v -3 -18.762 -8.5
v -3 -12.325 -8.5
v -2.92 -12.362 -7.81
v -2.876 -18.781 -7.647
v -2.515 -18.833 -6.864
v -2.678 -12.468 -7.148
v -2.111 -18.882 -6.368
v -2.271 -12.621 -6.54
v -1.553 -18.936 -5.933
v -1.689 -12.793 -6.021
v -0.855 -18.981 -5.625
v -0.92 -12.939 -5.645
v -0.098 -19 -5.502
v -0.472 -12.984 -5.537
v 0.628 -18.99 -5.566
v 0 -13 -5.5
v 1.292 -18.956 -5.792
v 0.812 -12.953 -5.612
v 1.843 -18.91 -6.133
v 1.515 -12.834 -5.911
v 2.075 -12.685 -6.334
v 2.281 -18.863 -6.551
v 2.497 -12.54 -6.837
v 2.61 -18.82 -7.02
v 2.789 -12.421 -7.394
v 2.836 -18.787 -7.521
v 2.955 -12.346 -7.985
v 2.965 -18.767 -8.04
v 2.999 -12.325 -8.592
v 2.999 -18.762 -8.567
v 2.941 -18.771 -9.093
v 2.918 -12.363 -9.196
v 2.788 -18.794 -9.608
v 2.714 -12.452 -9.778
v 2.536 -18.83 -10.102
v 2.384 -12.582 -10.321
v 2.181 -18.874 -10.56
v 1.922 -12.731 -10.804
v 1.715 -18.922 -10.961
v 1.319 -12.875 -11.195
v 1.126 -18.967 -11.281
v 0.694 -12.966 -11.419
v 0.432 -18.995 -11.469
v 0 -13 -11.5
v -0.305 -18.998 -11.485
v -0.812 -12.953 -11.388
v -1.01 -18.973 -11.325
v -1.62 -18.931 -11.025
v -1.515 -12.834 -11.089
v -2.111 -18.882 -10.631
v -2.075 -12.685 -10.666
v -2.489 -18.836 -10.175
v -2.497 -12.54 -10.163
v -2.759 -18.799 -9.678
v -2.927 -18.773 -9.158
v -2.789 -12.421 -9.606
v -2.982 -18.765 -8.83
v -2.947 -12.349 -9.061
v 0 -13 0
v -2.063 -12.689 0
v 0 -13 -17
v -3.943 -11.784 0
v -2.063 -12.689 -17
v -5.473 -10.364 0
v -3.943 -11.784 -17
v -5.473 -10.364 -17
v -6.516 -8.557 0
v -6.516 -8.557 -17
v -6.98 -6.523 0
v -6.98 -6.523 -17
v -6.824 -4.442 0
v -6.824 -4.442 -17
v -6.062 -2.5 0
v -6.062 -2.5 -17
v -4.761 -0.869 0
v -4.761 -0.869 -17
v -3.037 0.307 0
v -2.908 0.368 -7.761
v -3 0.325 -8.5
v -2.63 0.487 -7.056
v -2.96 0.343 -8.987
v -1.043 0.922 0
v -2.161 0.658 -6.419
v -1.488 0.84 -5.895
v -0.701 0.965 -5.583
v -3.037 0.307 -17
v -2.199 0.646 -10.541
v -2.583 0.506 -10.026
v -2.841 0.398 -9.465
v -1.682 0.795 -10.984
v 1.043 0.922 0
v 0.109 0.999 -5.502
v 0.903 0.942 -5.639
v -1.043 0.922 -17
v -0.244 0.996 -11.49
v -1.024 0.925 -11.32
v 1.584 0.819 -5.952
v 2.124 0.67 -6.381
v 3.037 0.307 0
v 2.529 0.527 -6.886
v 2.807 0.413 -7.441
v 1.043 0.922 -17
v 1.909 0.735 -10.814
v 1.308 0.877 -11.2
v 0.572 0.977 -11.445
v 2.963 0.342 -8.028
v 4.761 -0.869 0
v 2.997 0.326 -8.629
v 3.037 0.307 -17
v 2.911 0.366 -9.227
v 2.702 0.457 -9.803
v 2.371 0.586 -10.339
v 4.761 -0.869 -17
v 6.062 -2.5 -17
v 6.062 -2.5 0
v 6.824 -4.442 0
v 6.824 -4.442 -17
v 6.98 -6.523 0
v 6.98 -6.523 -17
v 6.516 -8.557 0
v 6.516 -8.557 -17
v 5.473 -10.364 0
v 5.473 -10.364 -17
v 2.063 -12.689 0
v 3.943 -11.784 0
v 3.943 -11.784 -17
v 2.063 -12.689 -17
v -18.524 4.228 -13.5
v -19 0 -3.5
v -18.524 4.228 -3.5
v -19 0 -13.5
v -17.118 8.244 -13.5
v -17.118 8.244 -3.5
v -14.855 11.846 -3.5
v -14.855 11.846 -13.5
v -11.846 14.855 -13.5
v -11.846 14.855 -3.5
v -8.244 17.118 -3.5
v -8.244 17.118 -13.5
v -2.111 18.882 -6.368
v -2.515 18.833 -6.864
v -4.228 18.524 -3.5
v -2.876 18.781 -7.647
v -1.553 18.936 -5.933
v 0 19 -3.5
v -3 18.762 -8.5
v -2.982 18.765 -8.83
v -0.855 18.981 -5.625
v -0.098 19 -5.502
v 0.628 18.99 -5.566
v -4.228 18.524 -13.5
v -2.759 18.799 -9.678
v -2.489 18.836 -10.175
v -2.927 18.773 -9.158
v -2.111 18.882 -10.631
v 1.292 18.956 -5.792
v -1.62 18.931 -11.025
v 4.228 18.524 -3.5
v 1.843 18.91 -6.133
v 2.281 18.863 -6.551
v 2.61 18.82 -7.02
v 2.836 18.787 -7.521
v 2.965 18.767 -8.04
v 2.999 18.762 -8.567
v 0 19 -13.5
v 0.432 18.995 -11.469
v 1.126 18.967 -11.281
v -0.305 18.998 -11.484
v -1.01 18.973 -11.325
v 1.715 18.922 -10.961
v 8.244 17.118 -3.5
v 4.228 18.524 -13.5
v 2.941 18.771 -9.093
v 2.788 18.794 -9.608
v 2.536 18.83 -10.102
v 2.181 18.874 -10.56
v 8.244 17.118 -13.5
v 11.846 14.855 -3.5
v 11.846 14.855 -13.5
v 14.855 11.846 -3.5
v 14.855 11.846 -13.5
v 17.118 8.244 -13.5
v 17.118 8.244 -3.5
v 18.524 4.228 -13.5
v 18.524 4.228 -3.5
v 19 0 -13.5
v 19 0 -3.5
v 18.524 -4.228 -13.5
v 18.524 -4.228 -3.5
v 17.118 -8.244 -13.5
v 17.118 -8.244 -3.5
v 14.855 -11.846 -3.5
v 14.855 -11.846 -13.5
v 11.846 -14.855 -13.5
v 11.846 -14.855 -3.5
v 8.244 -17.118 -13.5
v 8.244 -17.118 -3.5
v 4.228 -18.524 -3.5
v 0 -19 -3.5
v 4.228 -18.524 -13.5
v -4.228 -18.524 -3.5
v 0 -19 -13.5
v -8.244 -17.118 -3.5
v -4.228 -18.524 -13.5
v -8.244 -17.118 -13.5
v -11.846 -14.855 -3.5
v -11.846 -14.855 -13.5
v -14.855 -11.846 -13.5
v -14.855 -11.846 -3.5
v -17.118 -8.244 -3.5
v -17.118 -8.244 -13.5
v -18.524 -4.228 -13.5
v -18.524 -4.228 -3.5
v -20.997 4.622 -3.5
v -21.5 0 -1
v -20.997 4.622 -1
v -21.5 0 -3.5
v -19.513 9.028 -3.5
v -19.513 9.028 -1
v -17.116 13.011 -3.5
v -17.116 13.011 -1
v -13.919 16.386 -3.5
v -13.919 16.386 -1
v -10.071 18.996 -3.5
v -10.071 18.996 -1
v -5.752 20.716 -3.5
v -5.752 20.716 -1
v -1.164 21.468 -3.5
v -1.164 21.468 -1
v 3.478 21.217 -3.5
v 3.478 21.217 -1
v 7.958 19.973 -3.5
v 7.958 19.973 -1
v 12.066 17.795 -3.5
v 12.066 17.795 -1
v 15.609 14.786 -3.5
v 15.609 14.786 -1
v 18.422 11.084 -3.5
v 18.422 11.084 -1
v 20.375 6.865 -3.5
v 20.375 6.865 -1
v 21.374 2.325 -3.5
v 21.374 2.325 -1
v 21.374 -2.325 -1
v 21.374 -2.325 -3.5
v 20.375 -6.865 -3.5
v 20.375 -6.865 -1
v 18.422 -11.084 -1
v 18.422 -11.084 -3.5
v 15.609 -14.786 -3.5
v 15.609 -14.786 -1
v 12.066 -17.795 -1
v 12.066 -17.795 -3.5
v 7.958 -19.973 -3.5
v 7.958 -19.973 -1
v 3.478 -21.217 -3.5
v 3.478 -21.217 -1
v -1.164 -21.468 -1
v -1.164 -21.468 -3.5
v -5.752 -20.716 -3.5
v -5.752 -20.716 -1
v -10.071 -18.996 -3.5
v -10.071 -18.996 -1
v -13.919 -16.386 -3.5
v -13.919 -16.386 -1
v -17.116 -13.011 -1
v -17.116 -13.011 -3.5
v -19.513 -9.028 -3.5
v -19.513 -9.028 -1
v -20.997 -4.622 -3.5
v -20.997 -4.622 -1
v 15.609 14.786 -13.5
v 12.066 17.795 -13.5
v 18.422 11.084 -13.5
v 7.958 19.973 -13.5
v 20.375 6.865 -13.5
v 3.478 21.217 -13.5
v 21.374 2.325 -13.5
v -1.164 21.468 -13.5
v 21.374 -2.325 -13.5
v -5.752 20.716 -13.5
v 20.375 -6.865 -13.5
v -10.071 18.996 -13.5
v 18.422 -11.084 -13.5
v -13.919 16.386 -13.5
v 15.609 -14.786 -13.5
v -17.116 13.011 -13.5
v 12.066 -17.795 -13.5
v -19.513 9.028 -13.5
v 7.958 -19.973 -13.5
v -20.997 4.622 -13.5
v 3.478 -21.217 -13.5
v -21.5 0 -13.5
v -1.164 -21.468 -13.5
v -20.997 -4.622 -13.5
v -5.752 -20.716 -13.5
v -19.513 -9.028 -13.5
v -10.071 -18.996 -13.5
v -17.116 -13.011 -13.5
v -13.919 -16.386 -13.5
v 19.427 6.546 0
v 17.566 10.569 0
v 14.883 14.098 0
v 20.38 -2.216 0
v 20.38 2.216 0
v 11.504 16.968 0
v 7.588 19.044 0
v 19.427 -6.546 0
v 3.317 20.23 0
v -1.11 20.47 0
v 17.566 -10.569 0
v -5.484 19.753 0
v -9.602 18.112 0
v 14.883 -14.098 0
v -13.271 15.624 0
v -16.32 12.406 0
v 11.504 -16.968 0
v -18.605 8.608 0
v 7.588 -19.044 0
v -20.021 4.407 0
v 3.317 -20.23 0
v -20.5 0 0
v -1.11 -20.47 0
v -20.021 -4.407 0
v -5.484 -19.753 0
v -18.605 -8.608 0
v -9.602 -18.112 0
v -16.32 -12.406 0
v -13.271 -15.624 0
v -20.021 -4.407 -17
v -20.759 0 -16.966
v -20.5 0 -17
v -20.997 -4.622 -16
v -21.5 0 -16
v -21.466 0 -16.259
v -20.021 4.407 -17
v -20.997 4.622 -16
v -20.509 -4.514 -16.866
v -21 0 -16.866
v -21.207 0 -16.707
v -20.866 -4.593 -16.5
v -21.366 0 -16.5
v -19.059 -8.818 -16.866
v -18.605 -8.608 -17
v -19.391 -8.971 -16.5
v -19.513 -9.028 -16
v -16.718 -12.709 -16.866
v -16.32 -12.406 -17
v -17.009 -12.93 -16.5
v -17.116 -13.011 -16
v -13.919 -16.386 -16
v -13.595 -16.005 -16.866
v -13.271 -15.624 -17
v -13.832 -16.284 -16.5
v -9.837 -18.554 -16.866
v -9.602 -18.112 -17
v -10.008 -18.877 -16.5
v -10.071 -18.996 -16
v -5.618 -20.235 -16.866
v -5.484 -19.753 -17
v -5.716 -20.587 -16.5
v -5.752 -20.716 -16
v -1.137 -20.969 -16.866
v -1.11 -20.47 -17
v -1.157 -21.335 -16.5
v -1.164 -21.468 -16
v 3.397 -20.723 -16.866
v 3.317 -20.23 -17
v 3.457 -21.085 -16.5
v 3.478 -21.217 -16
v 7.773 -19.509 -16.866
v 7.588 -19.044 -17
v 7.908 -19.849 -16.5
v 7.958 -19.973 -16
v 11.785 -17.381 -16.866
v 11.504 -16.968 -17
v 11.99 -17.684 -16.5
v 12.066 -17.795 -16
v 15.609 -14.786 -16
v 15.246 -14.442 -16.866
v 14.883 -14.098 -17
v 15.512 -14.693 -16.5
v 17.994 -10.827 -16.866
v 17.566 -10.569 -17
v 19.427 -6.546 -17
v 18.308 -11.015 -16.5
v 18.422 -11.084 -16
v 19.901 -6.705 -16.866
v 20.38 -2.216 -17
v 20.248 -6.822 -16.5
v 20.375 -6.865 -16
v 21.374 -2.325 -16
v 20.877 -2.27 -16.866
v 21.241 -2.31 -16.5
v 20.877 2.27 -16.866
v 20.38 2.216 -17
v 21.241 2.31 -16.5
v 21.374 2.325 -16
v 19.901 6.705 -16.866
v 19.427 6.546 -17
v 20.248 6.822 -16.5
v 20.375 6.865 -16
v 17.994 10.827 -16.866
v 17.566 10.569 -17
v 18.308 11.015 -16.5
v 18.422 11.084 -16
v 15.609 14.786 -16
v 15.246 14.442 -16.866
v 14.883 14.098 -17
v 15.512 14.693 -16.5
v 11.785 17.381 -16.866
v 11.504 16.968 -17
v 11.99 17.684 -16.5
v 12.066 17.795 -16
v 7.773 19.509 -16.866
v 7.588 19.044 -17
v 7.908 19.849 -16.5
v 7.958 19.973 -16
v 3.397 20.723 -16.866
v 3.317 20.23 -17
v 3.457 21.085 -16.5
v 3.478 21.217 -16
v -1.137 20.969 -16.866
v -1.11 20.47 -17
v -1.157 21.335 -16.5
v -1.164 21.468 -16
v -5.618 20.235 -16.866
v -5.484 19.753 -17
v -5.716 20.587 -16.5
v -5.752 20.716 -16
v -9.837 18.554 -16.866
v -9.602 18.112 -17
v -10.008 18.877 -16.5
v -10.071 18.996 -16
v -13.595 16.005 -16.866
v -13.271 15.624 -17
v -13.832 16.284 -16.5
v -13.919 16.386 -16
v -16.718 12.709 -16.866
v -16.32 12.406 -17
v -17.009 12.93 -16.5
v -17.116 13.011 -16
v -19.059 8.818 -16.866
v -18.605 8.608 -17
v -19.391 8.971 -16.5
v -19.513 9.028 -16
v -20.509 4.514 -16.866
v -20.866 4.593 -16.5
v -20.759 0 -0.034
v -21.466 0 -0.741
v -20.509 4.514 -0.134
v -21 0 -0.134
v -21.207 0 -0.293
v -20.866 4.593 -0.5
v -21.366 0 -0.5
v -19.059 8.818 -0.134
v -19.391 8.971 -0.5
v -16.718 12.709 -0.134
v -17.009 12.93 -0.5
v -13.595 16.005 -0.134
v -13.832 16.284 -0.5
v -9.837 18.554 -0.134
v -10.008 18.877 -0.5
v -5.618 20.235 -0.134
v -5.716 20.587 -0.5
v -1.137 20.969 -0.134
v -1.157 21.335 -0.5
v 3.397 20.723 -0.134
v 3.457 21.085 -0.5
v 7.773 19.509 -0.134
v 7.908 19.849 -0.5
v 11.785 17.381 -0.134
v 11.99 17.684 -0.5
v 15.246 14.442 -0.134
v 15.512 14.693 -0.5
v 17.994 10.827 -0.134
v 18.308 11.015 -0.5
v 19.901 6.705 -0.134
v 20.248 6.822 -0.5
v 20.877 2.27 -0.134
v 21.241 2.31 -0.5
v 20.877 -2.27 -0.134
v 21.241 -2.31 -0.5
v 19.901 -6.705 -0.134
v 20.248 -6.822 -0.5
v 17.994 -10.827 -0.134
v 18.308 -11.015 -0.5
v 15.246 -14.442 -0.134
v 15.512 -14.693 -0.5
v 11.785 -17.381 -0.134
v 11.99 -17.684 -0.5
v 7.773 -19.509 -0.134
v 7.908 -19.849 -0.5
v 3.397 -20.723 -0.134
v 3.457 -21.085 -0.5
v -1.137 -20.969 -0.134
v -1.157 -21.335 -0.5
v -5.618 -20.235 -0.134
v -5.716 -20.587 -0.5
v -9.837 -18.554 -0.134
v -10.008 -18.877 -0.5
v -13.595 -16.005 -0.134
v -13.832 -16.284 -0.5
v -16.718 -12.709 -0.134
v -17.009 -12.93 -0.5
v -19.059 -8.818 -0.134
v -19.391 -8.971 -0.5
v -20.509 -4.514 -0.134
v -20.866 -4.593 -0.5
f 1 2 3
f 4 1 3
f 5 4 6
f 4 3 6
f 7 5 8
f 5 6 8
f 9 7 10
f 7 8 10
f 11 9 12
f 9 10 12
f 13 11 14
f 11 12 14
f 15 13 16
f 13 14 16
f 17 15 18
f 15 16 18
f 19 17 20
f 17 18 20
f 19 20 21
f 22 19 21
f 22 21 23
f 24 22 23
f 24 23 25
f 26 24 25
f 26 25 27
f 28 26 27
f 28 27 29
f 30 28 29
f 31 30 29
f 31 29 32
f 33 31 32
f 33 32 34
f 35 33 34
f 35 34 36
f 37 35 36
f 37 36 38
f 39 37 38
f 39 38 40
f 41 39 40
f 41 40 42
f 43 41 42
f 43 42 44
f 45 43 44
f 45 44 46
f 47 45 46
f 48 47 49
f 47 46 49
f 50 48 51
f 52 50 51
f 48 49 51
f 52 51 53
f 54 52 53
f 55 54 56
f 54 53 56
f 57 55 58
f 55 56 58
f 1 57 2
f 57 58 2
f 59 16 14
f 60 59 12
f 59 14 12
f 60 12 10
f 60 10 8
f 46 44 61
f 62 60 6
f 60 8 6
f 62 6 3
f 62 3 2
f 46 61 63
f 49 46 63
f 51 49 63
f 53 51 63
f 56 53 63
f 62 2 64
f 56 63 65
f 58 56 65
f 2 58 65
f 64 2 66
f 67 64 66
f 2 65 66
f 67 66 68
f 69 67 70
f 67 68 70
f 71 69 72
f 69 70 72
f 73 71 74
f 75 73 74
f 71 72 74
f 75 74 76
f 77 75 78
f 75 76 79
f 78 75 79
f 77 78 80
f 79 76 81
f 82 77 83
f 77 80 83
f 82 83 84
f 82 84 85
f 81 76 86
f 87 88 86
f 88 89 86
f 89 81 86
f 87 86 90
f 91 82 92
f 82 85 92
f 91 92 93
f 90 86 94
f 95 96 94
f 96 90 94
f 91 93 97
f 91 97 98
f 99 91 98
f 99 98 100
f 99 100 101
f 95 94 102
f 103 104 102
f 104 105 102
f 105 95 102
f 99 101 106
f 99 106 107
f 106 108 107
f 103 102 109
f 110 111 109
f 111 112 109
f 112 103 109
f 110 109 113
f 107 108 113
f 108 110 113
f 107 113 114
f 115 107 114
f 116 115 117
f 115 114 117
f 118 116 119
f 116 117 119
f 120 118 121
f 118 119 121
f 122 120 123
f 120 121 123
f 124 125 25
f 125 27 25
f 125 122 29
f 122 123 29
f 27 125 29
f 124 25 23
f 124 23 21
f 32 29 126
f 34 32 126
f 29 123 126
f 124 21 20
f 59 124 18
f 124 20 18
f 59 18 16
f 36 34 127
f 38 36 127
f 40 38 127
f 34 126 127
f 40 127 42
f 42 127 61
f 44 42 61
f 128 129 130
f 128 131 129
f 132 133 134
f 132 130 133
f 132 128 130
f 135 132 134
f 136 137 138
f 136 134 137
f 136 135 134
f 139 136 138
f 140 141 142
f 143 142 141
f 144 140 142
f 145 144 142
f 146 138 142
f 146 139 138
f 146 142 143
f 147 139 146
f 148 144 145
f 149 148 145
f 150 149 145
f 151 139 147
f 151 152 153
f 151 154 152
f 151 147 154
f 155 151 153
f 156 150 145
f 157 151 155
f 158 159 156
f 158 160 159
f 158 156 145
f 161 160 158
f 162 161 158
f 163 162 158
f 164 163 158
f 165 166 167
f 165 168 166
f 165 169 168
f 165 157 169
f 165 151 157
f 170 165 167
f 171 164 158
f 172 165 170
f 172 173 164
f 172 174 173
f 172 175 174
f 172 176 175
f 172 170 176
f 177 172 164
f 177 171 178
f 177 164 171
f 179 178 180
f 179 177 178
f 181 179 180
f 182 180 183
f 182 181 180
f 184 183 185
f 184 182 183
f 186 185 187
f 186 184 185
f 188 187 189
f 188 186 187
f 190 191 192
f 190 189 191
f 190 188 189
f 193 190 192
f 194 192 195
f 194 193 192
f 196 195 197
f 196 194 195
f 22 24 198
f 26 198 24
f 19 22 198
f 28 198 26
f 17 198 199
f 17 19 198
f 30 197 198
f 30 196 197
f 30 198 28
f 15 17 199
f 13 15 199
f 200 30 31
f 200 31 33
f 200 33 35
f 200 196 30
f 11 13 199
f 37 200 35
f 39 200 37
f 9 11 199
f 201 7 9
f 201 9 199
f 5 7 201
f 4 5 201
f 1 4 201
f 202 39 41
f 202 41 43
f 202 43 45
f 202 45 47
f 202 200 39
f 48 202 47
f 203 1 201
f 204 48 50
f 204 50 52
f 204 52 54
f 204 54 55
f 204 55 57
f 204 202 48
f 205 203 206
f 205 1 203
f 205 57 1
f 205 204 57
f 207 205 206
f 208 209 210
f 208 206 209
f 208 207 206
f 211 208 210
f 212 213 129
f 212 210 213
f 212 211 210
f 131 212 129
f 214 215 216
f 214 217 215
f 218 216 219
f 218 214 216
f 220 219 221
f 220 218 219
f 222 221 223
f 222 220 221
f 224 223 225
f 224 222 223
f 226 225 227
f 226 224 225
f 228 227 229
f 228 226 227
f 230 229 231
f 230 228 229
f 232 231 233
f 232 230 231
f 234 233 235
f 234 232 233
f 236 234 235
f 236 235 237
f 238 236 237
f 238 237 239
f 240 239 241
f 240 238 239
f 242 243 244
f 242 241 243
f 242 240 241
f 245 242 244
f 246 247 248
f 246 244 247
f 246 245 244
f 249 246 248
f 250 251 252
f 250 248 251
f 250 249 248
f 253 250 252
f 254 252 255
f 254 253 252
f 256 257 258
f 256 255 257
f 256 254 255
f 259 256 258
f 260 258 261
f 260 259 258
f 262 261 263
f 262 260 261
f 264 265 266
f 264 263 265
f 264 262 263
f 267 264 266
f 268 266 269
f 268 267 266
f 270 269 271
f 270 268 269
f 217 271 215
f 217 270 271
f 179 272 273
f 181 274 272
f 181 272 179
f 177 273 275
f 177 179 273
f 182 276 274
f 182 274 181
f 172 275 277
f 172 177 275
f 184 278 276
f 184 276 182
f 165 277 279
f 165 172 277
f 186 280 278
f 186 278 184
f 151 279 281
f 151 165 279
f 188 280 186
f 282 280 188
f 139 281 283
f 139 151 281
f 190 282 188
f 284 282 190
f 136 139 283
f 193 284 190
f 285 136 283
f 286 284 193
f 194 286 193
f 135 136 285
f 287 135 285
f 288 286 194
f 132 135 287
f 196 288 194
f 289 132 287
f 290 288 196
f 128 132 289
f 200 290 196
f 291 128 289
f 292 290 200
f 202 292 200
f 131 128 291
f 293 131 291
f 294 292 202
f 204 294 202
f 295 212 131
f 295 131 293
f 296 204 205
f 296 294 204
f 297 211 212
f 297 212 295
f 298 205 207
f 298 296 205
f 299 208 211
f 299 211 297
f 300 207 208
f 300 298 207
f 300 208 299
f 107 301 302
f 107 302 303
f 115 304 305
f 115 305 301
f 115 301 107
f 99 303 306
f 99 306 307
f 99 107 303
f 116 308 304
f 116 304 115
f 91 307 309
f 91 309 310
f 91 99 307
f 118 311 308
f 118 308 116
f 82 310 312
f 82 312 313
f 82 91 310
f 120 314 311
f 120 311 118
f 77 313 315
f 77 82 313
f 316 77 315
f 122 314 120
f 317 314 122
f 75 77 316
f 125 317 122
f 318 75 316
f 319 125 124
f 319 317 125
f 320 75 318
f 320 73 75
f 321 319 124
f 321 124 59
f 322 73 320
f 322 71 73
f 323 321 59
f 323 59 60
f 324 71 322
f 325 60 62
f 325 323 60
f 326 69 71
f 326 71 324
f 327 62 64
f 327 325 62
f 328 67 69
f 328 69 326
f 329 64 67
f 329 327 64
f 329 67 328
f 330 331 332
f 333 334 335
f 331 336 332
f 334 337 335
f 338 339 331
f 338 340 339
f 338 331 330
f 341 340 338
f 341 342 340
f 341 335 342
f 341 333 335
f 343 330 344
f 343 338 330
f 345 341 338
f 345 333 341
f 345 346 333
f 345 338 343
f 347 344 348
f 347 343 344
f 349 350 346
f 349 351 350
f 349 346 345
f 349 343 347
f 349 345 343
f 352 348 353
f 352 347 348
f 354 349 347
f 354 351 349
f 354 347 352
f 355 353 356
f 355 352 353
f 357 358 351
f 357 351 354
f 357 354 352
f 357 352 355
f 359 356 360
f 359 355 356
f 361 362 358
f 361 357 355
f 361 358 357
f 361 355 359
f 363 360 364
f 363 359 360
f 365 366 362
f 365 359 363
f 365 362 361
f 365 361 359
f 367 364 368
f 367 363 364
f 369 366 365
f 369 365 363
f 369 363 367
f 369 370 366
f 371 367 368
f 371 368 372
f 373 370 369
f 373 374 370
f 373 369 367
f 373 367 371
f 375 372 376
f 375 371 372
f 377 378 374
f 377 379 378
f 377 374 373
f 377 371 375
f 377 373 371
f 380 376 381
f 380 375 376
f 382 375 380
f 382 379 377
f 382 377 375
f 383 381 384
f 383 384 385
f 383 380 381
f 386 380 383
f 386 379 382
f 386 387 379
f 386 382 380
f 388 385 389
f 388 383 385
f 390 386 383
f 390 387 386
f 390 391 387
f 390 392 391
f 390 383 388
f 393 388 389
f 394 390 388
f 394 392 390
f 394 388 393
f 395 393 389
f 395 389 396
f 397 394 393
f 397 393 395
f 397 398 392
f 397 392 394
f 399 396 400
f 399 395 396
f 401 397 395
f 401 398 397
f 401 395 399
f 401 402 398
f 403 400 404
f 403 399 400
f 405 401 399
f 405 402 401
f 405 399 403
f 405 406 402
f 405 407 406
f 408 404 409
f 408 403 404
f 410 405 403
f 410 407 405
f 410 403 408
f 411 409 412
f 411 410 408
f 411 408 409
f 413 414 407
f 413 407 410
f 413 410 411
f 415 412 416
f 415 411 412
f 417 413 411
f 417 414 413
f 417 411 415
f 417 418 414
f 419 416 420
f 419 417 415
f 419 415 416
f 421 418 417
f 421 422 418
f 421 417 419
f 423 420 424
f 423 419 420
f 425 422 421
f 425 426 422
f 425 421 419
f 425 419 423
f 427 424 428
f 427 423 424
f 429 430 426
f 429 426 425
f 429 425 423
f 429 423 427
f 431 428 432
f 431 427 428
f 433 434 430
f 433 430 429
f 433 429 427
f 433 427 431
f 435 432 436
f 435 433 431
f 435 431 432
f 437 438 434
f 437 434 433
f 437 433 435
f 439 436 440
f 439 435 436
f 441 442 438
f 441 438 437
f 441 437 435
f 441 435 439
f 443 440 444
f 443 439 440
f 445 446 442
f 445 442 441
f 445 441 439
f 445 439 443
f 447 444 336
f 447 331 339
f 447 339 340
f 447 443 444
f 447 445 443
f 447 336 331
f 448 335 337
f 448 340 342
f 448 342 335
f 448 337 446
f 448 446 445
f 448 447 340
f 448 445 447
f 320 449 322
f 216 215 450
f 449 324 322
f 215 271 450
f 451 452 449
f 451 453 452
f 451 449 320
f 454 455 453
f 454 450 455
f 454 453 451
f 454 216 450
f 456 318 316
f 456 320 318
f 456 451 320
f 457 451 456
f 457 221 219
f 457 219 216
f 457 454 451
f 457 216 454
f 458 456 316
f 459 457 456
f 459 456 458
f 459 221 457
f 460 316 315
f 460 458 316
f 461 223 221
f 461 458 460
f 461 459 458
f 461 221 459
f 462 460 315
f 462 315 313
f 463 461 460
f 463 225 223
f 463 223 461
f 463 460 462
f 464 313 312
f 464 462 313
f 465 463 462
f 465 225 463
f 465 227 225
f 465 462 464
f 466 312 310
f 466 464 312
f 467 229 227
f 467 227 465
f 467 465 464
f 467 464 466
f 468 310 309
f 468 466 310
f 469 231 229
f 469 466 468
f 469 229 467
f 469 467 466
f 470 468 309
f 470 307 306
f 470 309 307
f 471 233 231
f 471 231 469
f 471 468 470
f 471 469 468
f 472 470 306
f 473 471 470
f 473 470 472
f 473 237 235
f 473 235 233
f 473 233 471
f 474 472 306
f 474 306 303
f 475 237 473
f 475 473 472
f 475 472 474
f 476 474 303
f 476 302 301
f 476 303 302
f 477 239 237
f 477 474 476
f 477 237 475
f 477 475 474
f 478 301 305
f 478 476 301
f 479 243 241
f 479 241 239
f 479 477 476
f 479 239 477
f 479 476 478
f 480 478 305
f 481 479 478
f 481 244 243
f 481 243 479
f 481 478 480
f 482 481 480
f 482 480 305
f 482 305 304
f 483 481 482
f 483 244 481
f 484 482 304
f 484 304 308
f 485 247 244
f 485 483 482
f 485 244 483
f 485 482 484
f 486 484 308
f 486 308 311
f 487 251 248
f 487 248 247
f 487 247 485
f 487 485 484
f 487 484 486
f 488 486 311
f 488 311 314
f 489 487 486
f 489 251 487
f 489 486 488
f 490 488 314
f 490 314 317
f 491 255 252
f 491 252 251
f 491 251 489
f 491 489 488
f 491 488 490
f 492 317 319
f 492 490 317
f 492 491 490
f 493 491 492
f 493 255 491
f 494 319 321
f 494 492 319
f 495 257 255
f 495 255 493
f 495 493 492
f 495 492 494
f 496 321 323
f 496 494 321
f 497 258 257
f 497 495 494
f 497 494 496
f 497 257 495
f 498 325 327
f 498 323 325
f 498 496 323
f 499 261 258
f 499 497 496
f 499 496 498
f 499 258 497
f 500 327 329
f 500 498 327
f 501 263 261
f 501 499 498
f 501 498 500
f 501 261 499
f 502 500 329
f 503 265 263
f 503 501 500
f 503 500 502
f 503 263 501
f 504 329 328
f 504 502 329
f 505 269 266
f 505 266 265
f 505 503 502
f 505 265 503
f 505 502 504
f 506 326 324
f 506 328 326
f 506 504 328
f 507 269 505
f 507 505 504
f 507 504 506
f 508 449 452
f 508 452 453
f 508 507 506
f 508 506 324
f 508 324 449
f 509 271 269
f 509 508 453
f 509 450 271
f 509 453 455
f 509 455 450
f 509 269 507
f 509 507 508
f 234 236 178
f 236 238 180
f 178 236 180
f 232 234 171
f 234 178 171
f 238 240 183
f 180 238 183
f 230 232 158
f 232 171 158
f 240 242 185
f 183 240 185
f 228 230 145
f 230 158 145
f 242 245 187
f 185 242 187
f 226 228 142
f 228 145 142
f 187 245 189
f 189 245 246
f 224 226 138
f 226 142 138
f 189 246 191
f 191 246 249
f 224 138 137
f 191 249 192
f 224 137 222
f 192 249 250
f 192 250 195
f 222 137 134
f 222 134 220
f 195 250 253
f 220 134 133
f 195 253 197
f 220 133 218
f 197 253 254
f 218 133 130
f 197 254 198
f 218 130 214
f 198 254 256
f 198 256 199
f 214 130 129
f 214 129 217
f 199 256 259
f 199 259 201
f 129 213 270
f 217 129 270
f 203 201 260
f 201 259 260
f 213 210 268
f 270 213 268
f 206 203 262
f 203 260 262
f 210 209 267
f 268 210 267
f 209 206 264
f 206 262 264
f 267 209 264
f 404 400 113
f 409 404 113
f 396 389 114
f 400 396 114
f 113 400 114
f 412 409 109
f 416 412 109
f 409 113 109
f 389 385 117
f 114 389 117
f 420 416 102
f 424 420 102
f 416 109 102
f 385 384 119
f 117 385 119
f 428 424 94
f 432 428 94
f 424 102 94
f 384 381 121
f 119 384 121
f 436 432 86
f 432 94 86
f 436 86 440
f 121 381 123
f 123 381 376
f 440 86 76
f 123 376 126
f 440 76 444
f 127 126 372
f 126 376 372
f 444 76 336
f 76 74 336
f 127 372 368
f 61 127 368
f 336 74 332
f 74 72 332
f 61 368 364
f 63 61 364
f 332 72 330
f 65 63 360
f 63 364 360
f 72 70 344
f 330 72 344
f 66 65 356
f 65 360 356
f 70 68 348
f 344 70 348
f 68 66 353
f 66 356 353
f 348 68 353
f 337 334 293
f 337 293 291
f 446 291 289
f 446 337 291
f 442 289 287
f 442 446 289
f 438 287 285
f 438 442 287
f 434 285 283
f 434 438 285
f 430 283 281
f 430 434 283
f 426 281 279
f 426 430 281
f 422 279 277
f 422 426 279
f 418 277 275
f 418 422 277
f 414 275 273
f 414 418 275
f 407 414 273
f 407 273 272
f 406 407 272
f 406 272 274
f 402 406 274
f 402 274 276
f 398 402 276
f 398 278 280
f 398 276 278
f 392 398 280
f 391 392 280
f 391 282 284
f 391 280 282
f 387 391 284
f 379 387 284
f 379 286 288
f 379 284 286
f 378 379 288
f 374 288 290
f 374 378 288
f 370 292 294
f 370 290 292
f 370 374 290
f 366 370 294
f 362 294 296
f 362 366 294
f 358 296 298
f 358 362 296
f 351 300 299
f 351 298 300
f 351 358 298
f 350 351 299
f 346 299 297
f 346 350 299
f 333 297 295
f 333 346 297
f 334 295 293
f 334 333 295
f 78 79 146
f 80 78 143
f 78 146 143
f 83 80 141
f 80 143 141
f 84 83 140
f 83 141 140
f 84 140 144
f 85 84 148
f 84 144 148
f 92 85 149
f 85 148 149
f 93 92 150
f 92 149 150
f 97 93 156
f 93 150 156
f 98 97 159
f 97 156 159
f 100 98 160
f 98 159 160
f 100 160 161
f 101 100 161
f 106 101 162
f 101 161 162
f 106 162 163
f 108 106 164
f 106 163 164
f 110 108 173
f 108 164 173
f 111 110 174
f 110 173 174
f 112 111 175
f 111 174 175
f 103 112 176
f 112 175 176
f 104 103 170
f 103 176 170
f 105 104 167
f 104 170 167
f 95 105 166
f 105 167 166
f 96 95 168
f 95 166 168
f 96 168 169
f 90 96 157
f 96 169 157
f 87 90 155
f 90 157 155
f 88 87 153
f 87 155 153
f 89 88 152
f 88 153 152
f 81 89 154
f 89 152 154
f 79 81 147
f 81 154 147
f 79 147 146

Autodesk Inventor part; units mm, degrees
ref_plane "YZ Plane" through (0, 0, 0) normal (1, 0, 0) x (0, 1, 0)
ref_plane "XY Plane" through (0, 0, 0) normal (0, 0, 1) x (1, 0, 0)
sketch "Sketch1" plane through (0, 0, 0) normal (0, 1, 0) x (-1, 0, 0)
  line L0 (0, 0) -> (21.5, 0)
  line L1 (21.5, 0) -> (21.5, -3.5)
  line L2 (21.5, -3.5) -> (19, -3.5)
  line L3 (19, -3.5) -> (19, -13.5)
  line L4 (19, -13.5) -> (21.5, -13.5)
  line L5 (21.5, -13.5) -> (21.5, -17)
  line L6 (21.5, -17) -> (0, -17)
  line L7 (0, -17) -> (0, 0)
  dimension "d1" = 3.5
  dimension "d2" = 3.5
  dimension "d3" = 17
  dimension "d4" = 38
  dimension "d5" = 43
revolve "Revolution1" add sketch "Sketch1" angle 360 about axis through (0, 0, -17) along (0, 0, 1)
sketch "Sketch2" plane through (0, 0, 0) normal (0, 0, 1) x (1, 0, 0)
  point P0 (0, 0)
  point P1 (0, -6)
  dimension "d14" = 6
hole "Hole1" at (0, -6, 0) direction (0, 0, -1) diameter 14 depth 17
fillet "Fillet1" radius 1 2 edges at (21.5, 0, 0) (21.5, 0, -17)
ref_plane "Work Plane1" through (0, 20, 0) normal (0, 1, 0) x (-1, 0, 0)
sketch "Sketch4" plane through (0, 20, 0) normal (0, 1, 0) x (-1, 0, 0)
  circle A0 centre (0, -8.5) radius 3
  line L0 (19, -13.5) -> (19, -3.5) projected
  point P0 (0, 0)
  point P1 (19, -8.5)
  dimension "d17" = 6
extrude "Extrusion1" cut sketch "Sketch4" against normal through all
properties part number "204"
